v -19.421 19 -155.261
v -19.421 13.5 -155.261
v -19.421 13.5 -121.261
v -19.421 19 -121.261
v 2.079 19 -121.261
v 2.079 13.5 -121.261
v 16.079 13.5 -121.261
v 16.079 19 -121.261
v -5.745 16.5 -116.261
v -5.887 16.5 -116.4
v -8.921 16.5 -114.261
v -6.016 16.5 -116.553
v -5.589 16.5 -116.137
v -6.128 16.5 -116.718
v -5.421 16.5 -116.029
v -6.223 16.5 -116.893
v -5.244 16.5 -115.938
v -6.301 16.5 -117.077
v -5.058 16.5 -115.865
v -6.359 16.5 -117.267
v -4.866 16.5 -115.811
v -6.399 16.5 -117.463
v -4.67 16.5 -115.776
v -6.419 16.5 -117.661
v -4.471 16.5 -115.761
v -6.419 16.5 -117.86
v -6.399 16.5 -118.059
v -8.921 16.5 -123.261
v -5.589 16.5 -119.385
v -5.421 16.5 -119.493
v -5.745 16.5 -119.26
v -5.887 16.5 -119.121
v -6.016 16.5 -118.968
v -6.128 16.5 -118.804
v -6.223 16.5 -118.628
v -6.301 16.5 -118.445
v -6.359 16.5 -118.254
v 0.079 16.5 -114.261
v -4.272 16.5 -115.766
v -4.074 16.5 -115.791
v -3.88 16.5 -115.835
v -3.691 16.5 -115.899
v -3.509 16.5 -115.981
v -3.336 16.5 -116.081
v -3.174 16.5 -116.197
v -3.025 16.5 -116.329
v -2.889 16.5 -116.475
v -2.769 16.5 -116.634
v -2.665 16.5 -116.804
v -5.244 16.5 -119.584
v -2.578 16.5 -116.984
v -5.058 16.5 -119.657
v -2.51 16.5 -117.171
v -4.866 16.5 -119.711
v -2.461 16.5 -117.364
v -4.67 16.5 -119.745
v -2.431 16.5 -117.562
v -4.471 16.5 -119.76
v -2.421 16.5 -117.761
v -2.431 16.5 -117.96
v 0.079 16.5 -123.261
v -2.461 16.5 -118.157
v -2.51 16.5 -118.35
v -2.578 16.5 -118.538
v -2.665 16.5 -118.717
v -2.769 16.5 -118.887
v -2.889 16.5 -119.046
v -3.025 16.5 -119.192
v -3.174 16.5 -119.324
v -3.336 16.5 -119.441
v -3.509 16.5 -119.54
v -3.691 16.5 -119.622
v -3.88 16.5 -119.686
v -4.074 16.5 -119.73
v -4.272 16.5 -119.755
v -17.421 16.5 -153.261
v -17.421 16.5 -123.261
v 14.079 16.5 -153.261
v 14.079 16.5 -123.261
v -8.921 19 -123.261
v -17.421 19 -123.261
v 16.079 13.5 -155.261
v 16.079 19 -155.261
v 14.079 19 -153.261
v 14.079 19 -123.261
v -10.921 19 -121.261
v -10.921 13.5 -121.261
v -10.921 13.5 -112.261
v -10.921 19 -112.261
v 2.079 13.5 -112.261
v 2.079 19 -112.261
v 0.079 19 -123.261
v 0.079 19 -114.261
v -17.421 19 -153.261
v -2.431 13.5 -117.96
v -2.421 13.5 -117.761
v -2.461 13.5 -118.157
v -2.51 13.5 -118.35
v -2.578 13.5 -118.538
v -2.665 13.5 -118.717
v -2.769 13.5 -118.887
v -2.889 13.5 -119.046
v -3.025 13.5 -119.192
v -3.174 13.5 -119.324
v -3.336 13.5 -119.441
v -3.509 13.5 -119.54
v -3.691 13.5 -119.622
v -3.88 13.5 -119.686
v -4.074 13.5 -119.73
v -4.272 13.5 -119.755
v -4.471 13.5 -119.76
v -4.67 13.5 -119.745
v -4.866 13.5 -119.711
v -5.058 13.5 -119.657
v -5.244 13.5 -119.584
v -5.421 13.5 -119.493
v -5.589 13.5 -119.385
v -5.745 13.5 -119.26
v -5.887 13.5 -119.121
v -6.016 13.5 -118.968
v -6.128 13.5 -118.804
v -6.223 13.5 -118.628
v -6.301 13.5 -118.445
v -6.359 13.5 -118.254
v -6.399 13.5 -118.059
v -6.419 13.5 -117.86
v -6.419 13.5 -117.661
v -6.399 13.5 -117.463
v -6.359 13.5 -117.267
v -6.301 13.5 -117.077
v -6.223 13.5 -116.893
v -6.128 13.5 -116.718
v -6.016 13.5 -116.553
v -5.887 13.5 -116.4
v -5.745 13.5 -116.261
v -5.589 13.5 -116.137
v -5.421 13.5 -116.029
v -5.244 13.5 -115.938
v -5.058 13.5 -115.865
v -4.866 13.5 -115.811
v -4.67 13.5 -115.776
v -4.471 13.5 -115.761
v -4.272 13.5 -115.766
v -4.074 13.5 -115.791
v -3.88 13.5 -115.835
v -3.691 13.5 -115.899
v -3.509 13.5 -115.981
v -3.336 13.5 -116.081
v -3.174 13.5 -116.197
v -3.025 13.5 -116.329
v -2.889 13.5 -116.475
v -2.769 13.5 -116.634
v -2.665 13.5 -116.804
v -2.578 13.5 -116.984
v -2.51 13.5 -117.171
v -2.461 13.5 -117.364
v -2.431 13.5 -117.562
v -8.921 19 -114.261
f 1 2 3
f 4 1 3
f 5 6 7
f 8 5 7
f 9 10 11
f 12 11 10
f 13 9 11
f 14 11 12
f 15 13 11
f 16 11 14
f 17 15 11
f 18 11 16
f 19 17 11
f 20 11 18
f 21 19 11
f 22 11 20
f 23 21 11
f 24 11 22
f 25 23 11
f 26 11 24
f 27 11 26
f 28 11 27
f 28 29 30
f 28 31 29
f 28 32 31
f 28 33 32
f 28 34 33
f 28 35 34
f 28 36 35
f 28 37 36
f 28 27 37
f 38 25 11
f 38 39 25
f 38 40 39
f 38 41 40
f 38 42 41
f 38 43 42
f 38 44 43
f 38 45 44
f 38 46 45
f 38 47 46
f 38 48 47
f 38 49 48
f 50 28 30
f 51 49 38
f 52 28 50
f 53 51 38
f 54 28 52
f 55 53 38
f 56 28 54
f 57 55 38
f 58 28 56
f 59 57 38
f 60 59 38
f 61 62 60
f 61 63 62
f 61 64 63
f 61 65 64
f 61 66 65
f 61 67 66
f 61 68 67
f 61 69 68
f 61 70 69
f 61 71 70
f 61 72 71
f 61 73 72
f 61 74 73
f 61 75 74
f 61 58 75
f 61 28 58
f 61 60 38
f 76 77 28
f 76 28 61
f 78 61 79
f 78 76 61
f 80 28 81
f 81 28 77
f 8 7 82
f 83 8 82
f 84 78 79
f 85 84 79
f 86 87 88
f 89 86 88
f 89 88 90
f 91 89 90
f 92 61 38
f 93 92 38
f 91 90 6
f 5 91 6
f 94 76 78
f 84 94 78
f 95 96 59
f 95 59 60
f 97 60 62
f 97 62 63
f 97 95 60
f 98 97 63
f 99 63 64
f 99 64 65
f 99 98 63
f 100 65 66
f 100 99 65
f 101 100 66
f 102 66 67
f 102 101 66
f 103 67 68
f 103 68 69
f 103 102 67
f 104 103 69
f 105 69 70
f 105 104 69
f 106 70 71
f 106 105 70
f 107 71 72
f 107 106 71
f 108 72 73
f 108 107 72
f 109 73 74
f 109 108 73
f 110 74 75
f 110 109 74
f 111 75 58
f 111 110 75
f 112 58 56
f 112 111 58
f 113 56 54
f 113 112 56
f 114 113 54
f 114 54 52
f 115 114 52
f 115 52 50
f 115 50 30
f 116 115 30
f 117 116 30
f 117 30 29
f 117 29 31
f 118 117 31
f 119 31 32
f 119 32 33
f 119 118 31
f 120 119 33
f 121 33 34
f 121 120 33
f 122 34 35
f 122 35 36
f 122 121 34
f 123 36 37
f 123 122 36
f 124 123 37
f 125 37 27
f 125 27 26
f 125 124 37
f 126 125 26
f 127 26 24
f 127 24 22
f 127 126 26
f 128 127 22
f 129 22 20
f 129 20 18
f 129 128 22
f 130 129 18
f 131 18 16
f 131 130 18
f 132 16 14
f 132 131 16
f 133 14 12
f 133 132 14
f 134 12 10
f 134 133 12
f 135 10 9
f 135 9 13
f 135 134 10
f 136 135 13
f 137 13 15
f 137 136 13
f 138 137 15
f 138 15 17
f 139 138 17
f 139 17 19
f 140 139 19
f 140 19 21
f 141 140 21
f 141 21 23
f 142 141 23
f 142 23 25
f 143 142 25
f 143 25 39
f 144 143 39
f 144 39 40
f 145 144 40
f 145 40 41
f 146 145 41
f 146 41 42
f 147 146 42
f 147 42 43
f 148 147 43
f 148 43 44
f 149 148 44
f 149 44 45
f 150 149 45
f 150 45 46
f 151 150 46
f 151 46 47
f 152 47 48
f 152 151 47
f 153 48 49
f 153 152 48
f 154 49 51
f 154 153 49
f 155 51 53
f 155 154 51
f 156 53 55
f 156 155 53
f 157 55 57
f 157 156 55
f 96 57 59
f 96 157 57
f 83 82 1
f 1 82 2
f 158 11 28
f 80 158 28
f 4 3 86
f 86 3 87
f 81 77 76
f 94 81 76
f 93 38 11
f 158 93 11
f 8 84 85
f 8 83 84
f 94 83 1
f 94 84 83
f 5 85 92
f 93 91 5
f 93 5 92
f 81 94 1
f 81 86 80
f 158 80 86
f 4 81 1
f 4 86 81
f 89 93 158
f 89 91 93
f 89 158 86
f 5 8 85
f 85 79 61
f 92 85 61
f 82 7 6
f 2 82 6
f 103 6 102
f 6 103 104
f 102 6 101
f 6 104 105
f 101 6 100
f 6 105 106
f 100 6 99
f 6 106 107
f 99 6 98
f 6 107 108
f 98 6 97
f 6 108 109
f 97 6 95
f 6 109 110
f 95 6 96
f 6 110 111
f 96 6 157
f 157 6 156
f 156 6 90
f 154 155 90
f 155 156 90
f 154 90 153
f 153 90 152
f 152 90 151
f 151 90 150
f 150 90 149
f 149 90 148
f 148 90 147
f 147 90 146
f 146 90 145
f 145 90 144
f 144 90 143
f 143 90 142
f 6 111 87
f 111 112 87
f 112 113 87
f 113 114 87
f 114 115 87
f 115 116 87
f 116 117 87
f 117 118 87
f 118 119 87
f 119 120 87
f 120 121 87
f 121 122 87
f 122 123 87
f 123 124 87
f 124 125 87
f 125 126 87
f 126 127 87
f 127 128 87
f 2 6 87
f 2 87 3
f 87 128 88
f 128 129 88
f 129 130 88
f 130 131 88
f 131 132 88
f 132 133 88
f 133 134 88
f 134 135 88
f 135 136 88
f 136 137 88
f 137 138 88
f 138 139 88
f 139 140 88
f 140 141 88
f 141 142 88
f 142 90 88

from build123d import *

# Parameters (mm, degrees)
SKETCH1_R           = 20
BOSS_EXTRUDE1_DEPTH = 30
SCALE1_SCALE        = 0.1
BOSS_EXTRUDE2_DEPTH = 5.5


with BuildPart() as part:
    # Sketch1 → Boss-Extrude1 (new body)
    with BuildSketch(Plane(origin=(0, 0, 0), x_dir=(1, 0, 0), z_dir=(0, 1, 0))):
        Polygon((17.5, -90), (17.5, 0), (157.5, 0), (157.5, 300), (-157.5, 300), (-157.5, 0), (-72.5, 0), (-72.5, -90), align=None)
        with Locations((-27.5, -55)):
            Circle(SKETCH1_R, mode=Mode.SUBTRACT)
    extrude(amount=BOSS_EXTRUDE1_DEPTH)


with BuildPart() as part_1:
    # Scale1: scaled about (-1.856978843, 15, -136.956329807)
    add(part.part.scale(SCALE1_SCALE).moved(Location((-1.671280959, 13.5, -123.260696826))))

    # Sketch2 → Boss-Extrude2 (add)
    with BuildSketch(Plane.XZ.offset(-13.5)):
        Polygon((-19.421280958, -155.260696826), (-19.421280958, -121.260696826), (-10.921280958, -121.260696826), (-10.921280958, -112.260696826), (2.078719042, -112.260696826), (2.078719042, -121.260696826), (16.078719042, -121.260696826), (16.078719042, -155.260696826), align=None)
        Polygon((14.078719042, -153.260696826), (14.078719042, -123.260696826), (0.078719042, -123.260696826), (0.078719042, -114.260696826), (-8.921280958, -114.260696826), (-8.921280958, -123.260696826), (-17.421280958, -123.260696826), (-17.421280958, -153.260696826), align=None, mode=Mode.SUBTRACT)
    extrude(amount=-BOSS_EXTRUDE2_DEPTH)


solid = part_1.part
